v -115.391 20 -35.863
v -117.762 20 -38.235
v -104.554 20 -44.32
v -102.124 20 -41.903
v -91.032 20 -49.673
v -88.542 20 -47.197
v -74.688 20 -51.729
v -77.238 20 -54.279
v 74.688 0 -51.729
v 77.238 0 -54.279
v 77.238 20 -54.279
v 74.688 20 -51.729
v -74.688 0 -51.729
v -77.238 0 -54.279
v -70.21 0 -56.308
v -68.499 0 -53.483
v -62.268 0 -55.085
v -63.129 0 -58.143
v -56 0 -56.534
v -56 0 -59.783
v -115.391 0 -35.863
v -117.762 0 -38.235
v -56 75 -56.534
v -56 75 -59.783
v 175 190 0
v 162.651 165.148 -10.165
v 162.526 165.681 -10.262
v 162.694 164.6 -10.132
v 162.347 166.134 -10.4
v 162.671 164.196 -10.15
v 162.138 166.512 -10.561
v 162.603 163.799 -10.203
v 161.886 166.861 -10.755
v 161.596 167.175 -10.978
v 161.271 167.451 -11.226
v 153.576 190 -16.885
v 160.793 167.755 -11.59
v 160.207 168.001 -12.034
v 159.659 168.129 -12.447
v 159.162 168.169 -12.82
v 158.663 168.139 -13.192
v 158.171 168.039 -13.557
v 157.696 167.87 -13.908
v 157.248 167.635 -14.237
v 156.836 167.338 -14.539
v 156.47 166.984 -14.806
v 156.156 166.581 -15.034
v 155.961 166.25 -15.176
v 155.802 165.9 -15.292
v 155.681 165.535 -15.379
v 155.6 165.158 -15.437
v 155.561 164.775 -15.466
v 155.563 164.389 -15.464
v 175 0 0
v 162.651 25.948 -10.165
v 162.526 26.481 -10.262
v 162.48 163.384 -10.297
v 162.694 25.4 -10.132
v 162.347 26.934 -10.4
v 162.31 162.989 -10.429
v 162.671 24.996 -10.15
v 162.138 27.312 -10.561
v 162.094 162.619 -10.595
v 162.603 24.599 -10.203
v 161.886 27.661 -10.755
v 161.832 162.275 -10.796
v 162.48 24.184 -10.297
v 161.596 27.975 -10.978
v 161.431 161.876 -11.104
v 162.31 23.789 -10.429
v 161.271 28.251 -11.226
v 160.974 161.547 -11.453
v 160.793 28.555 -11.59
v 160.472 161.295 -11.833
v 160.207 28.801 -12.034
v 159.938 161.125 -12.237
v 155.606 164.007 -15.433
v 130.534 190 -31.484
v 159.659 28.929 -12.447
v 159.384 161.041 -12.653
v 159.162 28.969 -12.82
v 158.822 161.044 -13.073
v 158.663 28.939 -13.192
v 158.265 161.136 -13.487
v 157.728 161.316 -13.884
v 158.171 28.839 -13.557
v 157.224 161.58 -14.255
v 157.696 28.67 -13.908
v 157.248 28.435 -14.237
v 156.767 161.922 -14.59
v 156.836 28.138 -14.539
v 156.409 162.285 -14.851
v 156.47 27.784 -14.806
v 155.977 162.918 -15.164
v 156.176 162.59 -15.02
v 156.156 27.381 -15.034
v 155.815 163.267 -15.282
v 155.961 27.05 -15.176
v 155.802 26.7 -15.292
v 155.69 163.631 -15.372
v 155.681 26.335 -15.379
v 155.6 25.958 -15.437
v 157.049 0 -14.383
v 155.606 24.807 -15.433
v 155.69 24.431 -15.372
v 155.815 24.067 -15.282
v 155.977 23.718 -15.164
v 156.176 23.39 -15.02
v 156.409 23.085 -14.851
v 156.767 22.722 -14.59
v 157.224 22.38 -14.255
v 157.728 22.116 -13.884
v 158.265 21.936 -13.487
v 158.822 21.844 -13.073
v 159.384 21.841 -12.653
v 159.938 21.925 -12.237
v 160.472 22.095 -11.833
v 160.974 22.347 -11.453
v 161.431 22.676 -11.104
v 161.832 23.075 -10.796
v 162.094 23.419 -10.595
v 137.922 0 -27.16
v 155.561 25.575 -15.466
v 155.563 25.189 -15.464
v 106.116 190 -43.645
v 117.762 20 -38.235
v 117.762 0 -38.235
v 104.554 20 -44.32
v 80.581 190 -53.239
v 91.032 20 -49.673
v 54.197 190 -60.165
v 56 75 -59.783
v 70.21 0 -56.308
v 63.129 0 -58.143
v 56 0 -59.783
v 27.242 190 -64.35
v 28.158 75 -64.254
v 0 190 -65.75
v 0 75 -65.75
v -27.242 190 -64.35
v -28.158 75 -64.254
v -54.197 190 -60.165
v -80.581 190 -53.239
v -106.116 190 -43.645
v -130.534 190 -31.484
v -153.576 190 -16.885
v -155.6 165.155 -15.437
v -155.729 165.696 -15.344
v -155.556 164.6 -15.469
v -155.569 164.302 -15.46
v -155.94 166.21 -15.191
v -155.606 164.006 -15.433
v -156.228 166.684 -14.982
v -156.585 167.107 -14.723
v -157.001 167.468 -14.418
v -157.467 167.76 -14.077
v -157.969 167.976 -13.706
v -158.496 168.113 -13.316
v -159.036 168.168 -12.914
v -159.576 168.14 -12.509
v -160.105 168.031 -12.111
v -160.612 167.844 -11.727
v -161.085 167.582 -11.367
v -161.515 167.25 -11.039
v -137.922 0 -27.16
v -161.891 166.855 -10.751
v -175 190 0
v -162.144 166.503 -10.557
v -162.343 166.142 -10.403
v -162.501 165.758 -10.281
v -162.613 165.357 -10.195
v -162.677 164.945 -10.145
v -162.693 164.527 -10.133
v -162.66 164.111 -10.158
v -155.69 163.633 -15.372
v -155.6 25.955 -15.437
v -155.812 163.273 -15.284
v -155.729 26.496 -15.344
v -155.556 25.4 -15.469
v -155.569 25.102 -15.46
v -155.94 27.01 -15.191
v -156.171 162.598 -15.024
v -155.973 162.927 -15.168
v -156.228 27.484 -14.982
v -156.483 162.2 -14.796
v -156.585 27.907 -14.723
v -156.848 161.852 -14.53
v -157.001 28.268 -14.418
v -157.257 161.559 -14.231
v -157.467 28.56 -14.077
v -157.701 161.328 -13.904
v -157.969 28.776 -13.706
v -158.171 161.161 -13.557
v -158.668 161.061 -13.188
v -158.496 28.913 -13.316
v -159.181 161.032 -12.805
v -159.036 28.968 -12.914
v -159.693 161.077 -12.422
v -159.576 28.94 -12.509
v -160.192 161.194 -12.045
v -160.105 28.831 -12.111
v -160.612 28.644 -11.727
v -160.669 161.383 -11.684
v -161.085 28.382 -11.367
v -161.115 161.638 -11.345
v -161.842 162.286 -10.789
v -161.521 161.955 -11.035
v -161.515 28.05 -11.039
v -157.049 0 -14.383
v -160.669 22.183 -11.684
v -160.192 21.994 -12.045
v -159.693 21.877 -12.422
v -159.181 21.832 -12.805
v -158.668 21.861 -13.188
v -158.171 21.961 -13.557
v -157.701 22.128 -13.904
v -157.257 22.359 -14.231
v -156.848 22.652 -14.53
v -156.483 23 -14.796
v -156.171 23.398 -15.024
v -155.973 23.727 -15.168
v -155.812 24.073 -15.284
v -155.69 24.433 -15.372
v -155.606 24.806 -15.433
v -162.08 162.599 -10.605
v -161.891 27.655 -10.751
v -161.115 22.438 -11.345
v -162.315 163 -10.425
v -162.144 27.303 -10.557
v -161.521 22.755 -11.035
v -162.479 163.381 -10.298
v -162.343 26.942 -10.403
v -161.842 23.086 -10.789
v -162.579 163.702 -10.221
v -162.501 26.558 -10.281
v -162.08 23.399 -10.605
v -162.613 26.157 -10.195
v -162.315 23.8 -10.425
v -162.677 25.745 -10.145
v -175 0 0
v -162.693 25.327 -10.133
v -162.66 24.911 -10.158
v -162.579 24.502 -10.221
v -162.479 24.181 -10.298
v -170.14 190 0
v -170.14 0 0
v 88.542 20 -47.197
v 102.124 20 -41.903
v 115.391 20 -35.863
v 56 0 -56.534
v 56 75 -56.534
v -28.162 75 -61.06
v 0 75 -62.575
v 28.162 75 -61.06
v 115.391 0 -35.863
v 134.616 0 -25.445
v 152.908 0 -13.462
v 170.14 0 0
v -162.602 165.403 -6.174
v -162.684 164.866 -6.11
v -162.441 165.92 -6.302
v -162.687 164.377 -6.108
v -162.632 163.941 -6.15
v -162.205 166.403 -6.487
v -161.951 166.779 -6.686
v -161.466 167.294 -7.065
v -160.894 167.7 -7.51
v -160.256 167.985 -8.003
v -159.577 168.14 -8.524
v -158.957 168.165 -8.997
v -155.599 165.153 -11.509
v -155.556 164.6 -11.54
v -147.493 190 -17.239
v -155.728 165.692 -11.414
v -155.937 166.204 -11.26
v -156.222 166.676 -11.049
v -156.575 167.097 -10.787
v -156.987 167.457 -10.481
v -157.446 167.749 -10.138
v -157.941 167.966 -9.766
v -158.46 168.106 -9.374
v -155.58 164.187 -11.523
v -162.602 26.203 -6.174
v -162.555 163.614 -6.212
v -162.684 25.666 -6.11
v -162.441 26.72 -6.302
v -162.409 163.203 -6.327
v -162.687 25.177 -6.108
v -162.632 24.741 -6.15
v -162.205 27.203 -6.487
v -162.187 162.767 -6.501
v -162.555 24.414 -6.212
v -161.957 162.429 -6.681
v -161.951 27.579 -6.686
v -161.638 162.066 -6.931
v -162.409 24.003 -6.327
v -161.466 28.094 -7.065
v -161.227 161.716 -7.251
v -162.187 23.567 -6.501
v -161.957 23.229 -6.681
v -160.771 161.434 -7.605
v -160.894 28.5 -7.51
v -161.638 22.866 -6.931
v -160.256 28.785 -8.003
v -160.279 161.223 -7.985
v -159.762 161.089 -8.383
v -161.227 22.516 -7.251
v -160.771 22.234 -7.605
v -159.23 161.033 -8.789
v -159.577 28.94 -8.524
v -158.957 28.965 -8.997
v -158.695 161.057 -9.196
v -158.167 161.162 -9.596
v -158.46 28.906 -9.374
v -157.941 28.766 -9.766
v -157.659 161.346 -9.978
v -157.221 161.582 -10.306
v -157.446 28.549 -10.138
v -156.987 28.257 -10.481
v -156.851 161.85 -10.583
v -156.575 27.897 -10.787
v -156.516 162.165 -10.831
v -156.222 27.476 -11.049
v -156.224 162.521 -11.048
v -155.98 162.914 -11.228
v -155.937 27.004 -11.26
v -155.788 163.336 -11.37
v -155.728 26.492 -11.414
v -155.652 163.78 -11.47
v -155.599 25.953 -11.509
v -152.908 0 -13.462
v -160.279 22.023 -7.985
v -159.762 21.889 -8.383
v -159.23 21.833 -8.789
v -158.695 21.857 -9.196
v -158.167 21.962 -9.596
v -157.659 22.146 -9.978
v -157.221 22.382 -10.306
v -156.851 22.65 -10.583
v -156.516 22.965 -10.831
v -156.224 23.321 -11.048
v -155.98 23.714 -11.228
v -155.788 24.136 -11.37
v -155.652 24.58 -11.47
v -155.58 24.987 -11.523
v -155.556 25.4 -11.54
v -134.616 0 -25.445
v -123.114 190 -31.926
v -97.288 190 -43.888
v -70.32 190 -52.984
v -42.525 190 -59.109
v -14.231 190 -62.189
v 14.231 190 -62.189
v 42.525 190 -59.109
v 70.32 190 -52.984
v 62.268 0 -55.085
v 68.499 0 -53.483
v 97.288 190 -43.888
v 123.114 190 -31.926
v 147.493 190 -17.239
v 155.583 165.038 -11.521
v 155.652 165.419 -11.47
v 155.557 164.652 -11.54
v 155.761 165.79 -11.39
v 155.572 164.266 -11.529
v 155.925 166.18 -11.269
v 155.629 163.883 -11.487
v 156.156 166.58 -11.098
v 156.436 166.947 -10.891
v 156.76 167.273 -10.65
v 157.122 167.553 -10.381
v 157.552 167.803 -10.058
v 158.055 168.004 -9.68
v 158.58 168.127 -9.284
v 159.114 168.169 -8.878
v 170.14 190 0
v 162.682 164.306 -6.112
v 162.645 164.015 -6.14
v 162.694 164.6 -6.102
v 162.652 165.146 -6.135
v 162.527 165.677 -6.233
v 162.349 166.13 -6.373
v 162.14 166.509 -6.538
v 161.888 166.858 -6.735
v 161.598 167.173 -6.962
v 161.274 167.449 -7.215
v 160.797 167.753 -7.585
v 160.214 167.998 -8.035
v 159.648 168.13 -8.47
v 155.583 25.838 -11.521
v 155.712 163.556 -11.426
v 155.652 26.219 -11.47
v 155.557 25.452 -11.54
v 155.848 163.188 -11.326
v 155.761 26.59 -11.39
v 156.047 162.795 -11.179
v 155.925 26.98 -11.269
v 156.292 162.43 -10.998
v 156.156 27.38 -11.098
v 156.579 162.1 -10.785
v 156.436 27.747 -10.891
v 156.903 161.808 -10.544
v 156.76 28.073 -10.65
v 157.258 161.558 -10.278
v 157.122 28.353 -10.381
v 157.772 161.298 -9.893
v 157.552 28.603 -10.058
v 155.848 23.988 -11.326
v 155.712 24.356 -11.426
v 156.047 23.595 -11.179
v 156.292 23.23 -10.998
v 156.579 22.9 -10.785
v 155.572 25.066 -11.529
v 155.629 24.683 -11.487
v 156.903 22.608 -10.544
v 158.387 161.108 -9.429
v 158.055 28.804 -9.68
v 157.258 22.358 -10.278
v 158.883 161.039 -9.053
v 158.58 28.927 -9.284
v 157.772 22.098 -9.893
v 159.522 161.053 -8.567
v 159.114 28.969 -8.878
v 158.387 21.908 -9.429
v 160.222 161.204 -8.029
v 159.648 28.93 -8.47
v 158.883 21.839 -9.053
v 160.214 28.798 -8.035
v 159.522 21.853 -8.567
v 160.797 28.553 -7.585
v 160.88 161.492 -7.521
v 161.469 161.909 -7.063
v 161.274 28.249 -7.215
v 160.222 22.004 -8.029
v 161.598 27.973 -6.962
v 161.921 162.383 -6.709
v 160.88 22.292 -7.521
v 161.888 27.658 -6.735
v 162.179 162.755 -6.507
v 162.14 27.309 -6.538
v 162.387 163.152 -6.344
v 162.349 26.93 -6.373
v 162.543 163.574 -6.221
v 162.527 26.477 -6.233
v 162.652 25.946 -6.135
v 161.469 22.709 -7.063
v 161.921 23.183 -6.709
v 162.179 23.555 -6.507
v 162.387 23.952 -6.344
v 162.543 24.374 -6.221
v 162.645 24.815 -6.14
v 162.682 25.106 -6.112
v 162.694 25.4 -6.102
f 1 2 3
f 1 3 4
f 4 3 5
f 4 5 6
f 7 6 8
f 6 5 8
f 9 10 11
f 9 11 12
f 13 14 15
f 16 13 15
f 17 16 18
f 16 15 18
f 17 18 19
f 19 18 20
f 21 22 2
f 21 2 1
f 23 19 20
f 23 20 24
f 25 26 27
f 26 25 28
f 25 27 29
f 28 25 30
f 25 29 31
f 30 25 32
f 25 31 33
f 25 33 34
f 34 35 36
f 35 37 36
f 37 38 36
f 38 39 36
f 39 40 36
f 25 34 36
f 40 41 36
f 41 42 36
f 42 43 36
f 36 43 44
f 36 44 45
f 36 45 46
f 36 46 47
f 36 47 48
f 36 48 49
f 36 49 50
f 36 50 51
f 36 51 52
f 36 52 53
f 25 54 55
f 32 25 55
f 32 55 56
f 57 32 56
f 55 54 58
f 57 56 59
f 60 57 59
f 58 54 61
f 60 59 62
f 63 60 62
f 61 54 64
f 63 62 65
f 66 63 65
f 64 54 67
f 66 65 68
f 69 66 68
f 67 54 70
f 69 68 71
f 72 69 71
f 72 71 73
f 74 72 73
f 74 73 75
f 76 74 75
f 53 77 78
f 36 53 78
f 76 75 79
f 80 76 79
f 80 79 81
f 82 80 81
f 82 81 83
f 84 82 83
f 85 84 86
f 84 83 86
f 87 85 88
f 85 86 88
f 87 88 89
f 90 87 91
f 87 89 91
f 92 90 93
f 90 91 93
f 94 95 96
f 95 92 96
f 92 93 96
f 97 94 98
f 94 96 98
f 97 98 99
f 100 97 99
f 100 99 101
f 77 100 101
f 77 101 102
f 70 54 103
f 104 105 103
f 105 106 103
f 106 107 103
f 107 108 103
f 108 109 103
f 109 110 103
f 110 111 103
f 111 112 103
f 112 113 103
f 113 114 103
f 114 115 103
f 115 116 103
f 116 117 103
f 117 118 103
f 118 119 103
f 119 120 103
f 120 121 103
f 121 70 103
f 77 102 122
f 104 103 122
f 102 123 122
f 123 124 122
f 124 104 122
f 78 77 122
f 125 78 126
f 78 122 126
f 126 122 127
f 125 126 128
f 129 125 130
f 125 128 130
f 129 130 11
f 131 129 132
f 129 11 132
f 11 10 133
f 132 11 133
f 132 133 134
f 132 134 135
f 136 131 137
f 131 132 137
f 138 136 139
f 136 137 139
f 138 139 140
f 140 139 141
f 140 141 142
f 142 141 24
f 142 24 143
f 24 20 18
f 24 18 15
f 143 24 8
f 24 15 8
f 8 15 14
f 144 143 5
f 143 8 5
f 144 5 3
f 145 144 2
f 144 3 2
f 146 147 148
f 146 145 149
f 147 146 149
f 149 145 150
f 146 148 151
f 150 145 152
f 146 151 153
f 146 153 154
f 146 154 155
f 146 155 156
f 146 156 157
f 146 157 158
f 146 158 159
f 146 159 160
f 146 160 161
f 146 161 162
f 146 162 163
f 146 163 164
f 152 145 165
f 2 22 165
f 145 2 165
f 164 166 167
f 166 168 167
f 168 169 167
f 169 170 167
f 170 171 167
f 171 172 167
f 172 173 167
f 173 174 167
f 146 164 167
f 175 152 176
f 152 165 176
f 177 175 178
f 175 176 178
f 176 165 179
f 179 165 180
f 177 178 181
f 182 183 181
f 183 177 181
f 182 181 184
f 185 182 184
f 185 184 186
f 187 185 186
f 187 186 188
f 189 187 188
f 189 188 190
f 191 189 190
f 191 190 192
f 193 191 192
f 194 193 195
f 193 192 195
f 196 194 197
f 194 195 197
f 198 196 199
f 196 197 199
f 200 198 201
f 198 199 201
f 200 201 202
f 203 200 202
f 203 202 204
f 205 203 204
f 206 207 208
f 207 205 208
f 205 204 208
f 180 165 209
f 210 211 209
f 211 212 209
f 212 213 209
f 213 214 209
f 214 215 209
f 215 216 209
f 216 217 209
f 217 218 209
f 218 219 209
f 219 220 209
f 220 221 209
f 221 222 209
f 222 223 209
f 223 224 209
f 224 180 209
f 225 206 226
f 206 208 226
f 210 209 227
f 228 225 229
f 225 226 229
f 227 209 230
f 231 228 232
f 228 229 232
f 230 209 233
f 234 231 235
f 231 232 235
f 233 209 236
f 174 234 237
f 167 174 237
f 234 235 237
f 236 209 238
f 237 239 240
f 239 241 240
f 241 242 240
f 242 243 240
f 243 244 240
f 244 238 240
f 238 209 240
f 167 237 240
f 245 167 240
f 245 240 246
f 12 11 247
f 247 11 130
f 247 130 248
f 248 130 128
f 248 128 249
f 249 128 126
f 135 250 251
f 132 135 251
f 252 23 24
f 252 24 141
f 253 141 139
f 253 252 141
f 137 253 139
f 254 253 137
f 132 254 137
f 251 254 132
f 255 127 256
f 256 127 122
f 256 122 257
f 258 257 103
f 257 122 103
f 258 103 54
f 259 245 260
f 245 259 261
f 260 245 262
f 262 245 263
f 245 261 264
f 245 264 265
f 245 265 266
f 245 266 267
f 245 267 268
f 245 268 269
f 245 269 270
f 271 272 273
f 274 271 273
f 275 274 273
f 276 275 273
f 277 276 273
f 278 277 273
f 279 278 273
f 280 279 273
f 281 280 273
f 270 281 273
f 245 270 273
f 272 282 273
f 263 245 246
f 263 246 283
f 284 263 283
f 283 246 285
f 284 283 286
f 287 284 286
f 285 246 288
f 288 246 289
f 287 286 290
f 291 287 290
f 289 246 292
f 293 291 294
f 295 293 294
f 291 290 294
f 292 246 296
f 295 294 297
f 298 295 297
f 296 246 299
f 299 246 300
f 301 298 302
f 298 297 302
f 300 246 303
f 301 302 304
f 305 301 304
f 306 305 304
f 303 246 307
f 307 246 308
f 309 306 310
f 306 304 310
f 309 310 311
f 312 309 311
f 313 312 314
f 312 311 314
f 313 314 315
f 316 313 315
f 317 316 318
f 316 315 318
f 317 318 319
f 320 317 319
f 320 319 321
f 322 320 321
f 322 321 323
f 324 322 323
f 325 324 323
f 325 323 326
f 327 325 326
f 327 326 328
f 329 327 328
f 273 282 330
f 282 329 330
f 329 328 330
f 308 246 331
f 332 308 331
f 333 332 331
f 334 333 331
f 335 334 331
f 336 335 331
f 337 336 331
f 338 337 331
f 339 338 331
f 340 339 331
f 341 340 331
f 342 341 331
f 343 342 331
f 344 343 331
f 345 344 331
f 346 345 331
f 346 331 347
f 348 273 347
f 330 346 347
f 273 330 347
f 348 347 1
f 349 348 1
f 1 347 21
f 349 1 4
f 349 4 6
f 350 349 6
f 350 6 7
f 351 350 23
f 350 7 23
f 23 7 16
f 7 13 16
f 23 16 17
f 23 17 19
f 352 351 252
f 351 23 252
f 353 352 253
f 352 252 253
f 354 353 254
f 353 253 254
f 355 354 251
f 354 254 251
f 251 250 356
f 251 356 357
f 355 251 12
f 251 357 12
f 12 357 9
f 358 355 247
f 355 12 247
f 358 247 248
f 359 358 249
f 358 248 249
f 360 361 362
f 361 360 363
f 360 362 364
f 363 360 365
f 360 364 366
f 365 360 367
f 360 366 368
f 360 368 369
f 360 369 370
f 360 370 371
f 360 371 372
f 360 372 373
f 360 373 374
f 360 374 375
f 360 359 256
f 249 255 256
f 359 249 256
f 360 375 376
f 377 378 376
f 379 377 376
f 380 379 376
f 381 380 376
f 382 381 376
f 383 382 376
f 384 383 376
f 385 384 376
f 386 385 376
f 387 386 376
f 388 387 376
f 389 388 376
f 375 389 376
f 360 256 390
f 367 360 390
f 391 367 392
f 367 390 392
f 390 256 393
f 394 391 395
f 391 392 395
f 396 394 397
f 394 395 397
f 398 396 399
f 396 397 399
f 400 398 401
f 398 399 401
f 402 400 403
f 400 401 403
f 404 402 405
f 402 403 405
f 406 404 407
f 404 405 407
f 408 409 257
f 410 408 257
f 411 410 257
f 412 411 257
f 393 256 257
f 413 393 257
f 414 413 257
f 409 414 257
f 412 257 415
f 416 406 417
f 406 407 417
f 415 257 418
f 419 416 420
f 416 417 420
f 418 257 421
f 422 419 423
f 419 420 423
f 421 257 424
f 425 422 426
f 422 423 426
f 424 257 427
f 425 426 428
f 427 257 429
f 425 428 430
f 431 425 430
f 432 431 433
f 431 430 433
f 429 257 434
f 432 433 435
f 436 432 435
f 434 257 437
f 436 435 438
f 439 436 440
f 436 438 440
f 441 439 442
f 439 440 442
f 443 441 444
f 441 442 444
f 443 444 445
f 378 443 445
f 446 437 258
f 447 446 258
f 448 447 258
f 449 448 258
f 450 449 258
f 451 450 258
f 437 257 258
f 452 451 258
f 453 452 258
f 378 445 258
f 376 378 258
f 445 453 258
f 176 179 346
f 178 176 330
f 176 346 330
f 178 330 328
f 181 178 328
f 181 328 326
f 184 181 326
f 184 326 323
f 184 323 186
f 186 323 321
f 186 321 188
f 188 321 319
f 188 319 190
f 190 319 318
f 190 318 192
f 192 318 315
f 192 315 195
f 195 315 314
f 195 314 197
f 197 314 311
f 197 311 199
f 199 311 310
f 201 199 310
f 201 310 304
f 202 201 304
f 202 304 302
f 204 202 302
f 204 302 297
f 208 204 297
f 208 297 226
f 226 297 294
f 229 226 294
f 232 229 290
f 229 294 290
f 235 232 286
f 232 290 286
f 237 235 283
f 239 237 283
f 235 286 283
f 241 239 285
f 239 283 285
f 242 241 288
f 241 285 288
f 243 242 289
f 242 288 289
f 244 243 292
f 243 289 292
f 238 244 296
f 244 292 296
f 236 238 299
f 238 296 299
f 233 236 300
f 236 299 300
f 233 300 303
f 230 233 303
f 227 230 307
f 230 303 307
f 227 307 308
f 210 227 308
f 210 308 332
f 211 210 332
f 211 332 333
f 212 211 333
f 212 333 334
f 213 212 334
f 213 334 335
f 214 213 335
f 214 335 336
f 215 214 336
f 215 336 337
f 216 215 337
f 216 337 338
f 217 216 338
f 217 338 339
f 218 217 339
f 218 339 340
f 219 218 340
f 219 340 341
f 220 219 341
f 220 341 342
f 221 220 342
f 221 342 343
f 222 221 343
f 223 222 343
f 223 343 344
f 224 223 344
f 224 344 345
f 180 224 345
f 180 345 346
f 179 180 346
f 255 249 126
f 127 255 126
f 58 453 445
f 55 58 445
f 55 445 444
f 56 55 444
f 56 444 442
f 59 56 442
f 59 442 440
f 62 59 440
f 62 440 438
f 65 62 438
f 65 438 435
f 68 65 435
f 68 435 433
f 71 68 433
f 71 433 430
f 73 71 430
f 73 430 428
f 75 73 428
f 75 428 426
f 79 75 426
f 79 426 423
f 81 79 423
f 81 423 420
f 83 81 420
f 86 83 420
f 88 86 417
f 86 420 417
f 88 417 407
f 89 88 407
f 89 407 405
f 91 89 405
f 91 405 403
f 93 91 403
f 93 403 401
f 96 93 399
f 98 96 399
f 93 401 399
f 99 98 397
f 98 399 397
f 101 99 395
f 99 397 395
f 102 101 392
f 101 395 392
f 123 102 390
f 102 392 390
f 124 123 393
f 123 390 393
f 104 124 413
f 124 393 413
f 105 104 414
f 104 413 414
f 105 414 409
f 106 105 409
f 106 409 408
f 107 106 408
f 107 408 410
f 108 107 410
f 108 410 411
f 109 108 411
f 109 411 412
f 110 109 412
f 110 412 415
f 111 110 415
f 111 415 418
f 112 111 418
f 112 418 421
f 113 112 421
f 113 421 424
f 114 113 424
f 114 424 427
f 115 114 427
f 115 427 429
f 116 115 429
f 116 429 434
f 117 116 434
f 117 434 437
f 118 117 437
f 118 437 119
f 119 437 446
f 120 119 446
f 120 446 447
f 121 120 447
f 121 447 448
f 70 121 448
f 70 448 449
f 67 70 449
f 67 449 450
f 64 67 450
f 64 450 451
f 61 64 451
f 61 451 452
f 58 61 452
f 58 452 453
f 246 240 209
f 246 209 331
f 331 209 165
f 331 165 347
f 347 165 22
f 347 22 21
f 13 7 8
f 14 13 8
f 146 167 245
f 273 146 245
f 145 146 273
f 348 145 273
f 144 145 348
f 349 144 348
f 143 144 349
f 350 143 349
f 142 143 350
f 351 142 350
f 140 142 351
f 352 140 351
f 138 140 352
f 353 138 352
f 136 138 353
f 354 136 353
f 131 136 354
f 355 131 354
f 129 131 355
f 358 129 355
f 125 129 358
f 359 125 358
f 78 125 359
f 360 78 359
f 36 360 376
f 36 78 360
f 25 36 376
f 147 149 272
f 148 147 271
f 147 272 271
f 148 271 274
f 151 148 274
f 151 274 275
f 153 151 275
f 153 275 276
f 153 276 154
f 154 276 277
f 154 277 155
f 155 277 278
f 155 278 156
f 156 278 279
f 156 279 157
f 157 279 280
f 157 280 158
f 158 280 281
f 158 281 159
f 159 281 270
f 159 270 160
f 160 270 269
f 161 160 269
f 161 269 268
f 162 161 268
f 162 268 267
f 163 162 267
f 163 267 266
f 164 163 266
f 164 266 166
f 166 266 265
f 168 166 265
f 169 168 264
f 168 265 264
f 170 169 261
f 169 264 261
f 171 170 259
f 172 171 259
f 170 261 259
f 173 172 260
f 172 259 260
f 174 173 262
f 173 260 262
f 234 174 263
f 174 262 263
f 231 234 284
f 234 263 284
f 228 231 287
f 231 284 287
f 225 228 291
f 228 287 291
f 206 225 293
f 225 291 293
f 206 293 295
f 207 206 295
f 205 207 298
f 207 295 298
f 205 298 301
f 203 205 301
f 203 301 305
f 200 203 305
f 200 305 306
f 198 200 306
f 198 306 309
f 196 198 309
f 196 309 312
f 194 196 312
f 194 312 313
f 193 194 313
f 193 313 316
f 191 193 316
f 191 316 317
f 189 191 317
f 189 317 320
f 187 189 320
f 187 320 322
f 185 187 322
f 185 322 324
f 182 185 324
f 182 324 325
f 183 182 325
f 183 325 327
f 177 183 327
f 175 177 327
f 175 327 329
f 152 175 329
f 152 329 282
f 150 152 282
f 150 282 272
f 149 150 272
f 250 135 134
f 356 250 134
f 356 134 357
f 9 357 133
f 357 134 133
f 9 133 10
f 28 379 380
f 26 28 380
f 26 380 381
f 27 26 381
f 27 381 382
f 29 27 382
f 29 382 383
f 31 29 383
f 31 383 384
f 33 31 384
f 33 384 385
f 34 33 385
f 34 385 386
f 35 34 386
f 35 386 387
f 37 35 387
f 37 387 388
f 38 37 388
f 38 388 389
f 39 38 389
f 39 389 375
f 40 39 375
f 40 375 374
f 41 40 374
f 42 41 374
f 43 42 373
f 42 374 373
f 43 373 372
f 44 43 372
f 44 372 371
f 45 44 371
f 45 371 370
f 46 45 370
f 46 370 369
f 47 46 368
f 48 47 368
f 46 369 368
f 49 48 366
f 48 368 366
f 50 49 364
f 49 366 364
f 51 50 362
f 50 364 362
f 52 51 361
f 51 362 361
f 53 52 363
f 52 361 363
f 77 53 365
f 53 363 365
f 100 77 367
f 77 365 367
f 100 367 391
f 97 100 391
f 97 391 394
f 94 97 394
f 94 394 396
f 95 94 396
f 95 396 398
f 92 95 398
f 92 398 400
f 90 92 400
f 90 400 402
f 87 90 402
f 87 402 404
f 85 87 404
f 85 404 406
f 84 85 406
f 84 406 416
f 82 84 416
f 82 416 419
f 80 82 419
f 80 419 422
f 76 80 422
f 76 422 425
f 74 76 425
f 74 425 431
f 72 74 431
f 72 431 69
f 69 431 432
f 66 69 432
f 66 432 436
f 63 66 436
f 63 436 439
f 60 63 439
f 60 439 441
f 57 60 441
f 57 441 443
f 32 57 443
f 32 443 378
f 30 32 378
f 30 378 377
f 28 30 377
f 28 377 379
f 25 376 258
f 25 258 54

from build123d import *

# Parameters (mm, degrees)
CURVED_PLATE_DEPTH      = 190
IR_CUTOUT_DEPTH         = 20
CHARGERBOX_CUTOUT_REACH = 67.75
SKETCH3_W               = 112
SKETCH3_H               = 75
SKETCH5_R               = 3.5687
MOUNTING_HOLES_DEPTH    = 66.75


with BuildPart() as part:
    # Sketch1 → Curved Plate (new body)
    with BuildSketch(Plane(origin=(0, 0, 0), x_dir=(1, 0, 0), z_dir=(0, 1, 0))):
        with BuildLine():
            Line((170.139573777, 0), (175, 0))
            ThreePointArc((175, 0), (0, 65.75), (-175, 0))
            Line((-175, 0), (-170.139573777, 0))
            ThreePointArc((-170.139573777, 0), (0, 62.575), (170.139573777, 0))
        make_face()
    extrude(amount=CURVED_PLATE_DEPTH)

    # Sketch2 → IR Cutout (cut)
    with BuildSketch(Plane(origin=(0, 0, 0), x_dir=(1, 0, 0), z_dir=(0, 1, 0))):
        with BuildLine():
            Line((-117.762328859, 38.234983169), (-105.521942389, 25.994596699))
            Line((-105.521942389, 25.994596699), (-101.986408483, 22.459062793))
            Line((-101.986408483, 22.459062793), (-73.702137236, 50.743334041))
            Line((-73.702137236, 50.743334041), (-77.237671141, 54.278867947))
            ThreePointArc((-77.237671141, 54.278867947), (-97.829451392, 47.089074697), (-117.762328859, 38.234983169))
        make_face()
        with BuildLine():
            Line((77.237671141, 54.278867947), (73.702137236, 50.743334041))
            Line((73.702137236, 50.743334041), (101.986408483, 22.459062793))
            Line((101.986408483, 22.459062793), (105.521942389, 25.994596699))
            Line((105.521942389, 25.994596699), (117.762328859, 38.234983169))
            ThreePointArc((117.762328859, 38.234983169), (97.829451392, 47.089074697), (77.237671141, 54.278867947))
        make_face()
    extrude(amount=IR_CUTOUT_DEPTH, mode=Mode.SUBTRACT)

    # Sketch3 → ChargerBox Cutout (cut, up to next)
    with BuildSketch(Plane.XY, mode=Mode.PRIVATE) as chargerbox_cutout_sk1:
        with Locations((0, 37.5)):
            Rectangle(SKETCH3_W, SKETCH3_H)
    chargerbox_cutout_tool1 = extrude(chargerbox_cutout_sk1.sketch, amount=-CHARGERBOX_CUTOUT_REACH, mode=Mode.PRIVATE) & part.part
    add(chargerbox_cutout_tool1.solids().sort_by_distance((0, 37.5, 0))[0], mode=Mode.SUBTRACT)

    # Sketch5 → Mounting Holes (cut, through all)
    with BuildSketch(Plane.XY):
        with Locations((-159.125, 164.6)):
            Circle(SKETCH5_R)
        with Locations((-159.125, 25.4)):
            Circle(SKETCH5_R)
        with Locations((159.125, 25.4)):
            Circle(SKETCH5_R)
        with Locations((159.125, 164.6)):
            Circle(SKETCH5_R)
    extrude(amount=-MOUNTING_HOLES_DEPTH, mode=Mode.SUBTRACT)


solid = part.part
